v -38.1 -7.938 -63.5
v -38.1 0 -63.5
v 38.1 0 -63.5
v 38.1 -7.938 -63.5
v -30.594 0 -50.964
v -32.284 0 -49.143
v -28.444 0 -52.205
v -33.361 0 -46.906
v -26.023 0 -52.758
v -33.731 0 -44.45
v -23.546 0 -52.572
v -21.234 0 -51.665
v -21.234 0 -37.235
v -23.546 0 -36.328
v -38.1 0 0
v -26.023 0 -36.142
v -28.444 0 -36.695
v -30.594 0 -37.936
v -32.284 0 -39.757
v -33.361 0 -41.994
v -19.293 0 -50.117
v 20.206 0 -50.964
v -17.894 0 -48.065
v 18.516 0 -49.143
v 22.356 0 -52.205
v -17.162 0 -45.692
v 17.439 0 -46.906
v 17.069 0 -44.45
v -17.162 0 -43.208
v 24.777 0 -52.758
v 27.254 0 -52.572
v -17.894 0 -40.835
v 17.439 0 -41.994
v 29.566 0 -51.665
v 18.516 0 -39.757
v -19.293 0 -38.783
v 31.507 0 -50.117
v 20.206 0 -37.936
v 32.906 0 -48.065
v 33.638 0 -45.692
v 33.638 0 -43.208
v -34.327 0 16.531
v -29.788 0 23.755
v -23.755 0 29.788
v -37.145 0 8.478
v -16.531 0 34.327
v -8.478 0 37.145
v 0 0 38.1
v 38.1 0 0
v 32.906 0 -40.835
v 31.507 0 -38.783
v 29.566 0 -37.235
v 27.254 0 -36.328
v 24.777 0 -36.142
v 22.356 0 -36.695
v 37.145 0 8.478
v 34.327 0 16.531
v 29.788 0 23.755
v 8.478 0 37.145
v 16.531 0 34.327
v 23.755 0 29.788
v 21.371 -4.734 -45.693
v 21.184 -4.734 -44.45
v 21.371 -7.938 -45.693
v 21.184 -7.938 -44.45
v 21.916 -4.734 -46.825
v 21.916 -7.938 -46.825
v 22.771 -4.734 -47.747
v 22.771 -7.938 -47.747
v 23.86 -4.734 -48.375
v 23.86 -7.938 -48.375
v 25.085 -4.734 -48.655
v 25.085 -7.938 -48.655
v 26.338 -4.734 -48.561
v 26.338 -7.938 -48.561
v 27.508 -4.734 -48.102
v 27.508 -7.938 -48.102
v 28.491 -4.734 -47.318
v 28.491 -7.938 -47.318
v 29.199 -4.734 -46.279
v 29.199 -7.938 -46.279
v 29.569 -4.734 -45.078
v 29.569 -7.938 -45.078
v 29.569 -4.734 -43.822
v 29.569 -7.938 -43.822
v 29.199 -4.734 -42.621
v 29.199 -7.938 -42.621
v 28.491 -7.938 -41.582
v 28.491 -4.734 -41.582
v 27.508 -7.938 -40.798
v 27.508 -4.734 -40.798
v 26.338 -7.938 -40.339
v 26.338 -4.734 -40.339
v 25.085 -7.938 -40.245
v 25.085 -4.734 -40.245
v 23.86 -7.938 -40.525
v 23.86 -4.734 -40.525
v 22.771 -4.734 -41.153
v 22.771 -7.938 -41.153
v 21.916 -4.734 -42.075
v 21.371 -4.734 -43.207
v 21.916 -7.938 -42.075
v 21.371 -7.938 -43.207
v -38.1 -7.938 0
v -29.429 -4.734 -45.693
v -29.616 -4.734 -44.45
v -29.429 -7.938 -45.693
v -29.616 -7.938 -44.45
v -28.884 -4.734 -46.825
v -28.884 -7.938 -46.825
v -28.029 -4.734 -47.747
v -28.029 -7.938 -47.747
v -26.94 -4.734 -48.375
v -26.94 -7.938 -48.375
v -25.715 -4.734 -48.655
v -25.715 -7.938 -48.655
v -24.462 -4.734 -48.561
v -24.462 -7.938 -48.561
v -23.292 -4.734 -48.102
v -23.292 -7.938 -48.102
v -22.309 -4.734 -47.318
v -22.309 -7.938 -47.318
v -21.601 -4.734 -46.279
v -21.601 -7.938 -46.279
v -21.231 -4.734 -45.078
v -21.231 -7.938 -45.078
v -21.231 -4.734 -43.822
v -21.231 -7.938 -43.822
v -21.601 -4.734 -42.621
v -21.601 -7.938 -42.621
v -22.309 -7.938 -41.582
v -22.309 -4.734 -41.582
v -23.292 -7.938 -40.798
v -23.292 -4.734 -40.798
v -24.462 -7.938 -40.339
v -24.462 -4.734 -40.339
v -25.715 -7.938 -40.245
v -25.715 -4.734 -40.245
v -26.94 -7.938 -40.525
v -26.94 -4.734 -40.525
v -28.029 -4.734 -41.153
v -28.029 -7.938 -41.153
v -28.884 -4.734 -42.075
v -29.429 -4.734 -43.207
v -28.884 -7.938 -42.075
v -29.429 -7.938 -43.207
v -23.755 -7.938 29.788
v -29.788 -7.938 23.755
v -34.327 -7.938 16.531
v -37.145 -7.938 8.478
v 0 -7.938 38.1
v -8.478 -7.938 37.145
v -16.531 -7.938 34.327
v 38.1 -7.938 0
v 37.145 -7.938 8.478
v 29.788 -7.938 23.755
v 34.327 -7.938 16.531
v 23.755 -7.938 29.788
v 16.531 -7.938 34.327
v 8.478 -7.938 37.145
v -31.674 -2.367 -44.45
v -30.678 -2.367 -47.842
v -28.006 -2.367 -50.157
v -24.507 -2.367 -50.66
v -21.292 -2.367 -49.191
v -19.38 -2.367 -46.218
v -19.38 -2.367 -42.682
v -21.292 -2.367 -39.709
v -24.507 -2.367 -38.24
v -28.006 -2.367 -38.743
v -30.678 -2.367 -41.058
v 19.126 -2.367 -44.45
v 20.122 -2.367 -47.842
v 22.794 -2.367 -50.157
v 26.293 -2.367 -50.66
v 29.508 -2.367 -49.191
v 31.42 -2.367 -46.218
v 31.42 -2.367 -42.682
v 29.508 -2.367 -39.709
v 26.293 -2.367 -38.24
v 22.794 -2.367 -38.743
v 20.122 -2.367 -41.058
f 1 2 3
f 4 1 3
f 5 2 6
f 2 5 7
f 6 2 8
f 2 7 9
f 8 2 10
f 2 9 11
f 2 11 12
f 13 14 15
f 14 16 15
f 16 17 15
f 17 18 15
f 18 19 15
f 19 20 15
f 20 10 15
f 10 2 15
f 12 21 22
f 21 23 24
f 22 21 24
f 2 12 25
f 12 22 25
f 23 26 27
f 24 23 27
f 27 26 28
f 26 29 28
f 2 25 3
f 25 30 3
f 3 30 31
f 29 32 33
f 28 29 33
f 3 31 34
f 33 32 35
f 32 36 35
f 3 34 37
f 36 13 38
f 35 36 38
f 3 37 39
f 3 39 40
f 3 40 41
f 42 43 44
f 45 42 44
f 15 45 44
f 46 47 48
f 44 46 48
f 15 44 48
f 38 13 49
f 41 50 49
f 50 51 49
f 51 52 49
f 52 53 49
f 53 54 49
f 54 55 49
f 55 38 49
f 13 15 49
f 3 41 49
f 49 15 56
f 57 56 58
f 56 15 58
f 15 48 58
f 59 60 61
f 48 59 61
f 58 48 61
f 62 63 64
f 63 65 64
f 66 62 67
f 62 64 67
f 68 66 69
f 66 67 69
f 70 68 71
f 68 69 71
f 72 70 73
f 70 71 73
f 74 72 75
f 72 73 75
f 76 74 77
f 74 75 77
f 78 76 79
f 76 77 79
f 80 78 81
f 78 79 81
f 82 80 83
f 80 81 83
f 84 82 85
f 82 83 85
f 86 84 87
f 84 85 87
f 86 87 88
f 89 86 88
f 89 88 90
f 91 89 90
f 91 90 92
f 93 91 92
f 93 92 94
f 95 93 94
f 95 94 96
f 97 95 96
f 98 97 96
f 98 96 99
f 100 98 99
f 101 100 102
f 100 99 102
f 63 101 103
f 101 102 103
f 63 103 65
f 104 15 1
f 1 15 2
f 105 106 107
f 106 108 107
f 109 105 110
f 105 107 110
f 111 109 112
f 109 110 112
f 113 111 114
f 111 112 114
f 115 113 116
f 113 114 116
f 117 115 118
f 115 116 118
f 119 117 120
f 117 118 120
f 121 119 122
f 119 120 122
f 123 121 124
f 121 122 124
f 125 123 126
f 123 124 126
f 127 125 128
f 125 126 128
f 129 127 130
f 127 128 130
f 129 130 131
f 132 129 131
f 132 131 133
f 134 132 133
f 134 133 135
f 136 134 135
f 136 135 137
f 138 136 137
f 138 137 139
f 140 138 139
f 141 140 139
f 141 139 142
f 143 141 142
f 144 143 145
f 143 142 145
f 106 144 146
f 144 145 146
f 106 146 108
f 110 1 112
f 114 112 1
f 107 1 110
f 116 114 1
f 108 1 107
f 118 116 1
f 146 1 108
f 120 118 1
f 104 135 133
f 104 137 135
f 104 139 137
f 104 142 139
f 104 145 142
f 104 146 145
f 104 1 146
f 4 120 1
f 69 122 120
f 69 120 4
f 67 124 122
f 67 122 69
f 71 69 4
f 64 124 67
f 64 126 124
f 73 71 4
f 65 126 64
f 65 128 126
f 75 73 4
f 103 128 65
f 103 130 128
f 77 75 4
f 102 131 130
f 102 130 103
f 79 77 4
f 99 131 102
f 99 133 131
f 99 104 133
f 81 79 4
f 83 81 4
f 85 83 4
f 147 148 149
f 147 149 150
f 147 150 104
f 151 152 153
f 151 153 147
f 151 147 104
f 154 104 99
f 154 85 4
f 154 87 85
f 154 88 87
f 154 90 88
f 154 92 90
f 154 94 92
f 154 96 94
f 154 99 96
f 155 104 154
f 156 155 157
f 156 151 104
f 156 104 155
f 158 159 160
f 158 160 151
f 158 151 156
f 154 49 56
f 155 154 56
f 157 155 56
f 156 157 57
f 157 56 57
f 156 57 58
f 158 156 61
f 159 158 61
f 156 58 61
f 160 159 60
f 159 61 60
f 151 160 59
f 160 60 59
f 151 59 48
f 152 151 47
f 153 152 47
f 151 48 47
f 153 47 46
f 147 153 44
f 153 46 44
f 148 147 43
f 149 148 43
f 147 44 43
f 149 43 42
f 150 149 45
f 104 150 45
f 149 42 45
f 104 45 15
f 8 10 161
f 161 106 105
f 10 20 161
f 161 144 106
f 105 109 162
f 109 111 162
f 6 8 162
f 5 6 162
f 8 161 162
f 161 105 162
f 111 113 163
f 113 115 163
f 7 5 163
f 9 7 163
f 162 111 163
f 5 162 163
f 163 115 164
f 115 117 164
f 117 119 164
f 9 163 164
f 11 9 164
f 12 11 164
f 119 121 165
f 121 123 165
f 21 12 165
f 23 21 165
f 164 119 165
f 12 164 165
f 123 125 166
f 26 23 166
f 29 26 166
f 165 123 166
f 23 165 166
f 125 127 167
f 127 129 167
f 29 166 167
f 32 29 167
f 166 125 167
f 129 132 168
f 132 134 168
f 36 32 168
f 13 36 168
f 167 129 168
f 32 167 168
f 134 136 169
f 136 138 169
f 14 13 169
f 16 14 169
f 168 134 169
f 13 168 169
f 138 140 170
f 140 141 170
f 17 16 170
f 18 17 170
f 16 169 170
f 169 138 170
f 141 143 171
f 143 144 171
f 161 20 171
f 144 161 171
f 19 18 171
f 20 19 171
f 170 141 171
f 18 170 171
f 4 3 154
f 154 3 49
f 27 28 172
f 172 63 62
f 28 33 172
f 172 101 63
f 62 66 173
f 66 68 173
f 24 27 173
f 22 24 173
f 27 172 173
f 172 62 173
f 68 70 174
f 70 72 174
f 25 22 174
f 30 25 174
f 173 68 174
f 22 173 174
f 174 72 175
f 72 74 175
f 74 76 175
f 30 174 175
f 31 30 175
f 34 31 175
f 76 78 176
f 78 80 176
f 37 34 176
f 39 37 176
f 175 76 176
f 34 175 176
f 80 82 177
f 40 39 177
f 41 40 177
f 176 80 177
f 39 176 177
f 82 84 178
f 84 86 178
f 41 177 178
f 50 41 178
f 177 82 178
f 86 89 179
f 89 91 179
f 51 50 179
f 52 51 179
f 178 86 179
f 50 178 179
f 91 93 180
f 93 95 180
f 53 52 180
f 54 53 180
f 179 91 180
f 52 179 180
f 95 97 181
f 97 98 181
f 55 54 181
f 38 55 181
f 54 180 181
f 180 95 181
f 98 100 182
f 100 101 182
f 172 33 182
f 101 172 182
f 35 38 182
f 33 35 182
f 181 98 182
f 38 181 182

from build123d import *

# Parameters (mm, degrees)
F1_DEPTH       = 7.9375
F2_D           = 8.4328
F2_CSINK_D     = 16.6624
F2_CSINK_ANGLE = 82


with BuildPart() as f1:
    # F0 (on Front) → F1 (new body)
    with BuildSketch(Plane.XZ):
        with BuildLine():
            Line((38.1, -63.5), (38.1, 0))
            ThreePointArc((38.1, 0), (0, 38.1), (-38.1, 0))
            Line((-38.1, 0), (-38.1, -63.5))
            Line((-38.1, -63.5), (38.1, -63.5))
        make_face()
    extrude(amount=F1_DEPTH)

    # F2 (through all)
    with Locations(Plane(origin=(0, 0, 0), x_dir=(1, 0, 0), z_dir=(0, 1, 0))):
        with Locations((-25.4, 44.45), (25.4, 44.45)):
            CounterSinkHole(F2_D / 2, F2_CSINK_D / 2, counter_sink_angle=F2_CSINK_ANGLE)


solid = f1.part
